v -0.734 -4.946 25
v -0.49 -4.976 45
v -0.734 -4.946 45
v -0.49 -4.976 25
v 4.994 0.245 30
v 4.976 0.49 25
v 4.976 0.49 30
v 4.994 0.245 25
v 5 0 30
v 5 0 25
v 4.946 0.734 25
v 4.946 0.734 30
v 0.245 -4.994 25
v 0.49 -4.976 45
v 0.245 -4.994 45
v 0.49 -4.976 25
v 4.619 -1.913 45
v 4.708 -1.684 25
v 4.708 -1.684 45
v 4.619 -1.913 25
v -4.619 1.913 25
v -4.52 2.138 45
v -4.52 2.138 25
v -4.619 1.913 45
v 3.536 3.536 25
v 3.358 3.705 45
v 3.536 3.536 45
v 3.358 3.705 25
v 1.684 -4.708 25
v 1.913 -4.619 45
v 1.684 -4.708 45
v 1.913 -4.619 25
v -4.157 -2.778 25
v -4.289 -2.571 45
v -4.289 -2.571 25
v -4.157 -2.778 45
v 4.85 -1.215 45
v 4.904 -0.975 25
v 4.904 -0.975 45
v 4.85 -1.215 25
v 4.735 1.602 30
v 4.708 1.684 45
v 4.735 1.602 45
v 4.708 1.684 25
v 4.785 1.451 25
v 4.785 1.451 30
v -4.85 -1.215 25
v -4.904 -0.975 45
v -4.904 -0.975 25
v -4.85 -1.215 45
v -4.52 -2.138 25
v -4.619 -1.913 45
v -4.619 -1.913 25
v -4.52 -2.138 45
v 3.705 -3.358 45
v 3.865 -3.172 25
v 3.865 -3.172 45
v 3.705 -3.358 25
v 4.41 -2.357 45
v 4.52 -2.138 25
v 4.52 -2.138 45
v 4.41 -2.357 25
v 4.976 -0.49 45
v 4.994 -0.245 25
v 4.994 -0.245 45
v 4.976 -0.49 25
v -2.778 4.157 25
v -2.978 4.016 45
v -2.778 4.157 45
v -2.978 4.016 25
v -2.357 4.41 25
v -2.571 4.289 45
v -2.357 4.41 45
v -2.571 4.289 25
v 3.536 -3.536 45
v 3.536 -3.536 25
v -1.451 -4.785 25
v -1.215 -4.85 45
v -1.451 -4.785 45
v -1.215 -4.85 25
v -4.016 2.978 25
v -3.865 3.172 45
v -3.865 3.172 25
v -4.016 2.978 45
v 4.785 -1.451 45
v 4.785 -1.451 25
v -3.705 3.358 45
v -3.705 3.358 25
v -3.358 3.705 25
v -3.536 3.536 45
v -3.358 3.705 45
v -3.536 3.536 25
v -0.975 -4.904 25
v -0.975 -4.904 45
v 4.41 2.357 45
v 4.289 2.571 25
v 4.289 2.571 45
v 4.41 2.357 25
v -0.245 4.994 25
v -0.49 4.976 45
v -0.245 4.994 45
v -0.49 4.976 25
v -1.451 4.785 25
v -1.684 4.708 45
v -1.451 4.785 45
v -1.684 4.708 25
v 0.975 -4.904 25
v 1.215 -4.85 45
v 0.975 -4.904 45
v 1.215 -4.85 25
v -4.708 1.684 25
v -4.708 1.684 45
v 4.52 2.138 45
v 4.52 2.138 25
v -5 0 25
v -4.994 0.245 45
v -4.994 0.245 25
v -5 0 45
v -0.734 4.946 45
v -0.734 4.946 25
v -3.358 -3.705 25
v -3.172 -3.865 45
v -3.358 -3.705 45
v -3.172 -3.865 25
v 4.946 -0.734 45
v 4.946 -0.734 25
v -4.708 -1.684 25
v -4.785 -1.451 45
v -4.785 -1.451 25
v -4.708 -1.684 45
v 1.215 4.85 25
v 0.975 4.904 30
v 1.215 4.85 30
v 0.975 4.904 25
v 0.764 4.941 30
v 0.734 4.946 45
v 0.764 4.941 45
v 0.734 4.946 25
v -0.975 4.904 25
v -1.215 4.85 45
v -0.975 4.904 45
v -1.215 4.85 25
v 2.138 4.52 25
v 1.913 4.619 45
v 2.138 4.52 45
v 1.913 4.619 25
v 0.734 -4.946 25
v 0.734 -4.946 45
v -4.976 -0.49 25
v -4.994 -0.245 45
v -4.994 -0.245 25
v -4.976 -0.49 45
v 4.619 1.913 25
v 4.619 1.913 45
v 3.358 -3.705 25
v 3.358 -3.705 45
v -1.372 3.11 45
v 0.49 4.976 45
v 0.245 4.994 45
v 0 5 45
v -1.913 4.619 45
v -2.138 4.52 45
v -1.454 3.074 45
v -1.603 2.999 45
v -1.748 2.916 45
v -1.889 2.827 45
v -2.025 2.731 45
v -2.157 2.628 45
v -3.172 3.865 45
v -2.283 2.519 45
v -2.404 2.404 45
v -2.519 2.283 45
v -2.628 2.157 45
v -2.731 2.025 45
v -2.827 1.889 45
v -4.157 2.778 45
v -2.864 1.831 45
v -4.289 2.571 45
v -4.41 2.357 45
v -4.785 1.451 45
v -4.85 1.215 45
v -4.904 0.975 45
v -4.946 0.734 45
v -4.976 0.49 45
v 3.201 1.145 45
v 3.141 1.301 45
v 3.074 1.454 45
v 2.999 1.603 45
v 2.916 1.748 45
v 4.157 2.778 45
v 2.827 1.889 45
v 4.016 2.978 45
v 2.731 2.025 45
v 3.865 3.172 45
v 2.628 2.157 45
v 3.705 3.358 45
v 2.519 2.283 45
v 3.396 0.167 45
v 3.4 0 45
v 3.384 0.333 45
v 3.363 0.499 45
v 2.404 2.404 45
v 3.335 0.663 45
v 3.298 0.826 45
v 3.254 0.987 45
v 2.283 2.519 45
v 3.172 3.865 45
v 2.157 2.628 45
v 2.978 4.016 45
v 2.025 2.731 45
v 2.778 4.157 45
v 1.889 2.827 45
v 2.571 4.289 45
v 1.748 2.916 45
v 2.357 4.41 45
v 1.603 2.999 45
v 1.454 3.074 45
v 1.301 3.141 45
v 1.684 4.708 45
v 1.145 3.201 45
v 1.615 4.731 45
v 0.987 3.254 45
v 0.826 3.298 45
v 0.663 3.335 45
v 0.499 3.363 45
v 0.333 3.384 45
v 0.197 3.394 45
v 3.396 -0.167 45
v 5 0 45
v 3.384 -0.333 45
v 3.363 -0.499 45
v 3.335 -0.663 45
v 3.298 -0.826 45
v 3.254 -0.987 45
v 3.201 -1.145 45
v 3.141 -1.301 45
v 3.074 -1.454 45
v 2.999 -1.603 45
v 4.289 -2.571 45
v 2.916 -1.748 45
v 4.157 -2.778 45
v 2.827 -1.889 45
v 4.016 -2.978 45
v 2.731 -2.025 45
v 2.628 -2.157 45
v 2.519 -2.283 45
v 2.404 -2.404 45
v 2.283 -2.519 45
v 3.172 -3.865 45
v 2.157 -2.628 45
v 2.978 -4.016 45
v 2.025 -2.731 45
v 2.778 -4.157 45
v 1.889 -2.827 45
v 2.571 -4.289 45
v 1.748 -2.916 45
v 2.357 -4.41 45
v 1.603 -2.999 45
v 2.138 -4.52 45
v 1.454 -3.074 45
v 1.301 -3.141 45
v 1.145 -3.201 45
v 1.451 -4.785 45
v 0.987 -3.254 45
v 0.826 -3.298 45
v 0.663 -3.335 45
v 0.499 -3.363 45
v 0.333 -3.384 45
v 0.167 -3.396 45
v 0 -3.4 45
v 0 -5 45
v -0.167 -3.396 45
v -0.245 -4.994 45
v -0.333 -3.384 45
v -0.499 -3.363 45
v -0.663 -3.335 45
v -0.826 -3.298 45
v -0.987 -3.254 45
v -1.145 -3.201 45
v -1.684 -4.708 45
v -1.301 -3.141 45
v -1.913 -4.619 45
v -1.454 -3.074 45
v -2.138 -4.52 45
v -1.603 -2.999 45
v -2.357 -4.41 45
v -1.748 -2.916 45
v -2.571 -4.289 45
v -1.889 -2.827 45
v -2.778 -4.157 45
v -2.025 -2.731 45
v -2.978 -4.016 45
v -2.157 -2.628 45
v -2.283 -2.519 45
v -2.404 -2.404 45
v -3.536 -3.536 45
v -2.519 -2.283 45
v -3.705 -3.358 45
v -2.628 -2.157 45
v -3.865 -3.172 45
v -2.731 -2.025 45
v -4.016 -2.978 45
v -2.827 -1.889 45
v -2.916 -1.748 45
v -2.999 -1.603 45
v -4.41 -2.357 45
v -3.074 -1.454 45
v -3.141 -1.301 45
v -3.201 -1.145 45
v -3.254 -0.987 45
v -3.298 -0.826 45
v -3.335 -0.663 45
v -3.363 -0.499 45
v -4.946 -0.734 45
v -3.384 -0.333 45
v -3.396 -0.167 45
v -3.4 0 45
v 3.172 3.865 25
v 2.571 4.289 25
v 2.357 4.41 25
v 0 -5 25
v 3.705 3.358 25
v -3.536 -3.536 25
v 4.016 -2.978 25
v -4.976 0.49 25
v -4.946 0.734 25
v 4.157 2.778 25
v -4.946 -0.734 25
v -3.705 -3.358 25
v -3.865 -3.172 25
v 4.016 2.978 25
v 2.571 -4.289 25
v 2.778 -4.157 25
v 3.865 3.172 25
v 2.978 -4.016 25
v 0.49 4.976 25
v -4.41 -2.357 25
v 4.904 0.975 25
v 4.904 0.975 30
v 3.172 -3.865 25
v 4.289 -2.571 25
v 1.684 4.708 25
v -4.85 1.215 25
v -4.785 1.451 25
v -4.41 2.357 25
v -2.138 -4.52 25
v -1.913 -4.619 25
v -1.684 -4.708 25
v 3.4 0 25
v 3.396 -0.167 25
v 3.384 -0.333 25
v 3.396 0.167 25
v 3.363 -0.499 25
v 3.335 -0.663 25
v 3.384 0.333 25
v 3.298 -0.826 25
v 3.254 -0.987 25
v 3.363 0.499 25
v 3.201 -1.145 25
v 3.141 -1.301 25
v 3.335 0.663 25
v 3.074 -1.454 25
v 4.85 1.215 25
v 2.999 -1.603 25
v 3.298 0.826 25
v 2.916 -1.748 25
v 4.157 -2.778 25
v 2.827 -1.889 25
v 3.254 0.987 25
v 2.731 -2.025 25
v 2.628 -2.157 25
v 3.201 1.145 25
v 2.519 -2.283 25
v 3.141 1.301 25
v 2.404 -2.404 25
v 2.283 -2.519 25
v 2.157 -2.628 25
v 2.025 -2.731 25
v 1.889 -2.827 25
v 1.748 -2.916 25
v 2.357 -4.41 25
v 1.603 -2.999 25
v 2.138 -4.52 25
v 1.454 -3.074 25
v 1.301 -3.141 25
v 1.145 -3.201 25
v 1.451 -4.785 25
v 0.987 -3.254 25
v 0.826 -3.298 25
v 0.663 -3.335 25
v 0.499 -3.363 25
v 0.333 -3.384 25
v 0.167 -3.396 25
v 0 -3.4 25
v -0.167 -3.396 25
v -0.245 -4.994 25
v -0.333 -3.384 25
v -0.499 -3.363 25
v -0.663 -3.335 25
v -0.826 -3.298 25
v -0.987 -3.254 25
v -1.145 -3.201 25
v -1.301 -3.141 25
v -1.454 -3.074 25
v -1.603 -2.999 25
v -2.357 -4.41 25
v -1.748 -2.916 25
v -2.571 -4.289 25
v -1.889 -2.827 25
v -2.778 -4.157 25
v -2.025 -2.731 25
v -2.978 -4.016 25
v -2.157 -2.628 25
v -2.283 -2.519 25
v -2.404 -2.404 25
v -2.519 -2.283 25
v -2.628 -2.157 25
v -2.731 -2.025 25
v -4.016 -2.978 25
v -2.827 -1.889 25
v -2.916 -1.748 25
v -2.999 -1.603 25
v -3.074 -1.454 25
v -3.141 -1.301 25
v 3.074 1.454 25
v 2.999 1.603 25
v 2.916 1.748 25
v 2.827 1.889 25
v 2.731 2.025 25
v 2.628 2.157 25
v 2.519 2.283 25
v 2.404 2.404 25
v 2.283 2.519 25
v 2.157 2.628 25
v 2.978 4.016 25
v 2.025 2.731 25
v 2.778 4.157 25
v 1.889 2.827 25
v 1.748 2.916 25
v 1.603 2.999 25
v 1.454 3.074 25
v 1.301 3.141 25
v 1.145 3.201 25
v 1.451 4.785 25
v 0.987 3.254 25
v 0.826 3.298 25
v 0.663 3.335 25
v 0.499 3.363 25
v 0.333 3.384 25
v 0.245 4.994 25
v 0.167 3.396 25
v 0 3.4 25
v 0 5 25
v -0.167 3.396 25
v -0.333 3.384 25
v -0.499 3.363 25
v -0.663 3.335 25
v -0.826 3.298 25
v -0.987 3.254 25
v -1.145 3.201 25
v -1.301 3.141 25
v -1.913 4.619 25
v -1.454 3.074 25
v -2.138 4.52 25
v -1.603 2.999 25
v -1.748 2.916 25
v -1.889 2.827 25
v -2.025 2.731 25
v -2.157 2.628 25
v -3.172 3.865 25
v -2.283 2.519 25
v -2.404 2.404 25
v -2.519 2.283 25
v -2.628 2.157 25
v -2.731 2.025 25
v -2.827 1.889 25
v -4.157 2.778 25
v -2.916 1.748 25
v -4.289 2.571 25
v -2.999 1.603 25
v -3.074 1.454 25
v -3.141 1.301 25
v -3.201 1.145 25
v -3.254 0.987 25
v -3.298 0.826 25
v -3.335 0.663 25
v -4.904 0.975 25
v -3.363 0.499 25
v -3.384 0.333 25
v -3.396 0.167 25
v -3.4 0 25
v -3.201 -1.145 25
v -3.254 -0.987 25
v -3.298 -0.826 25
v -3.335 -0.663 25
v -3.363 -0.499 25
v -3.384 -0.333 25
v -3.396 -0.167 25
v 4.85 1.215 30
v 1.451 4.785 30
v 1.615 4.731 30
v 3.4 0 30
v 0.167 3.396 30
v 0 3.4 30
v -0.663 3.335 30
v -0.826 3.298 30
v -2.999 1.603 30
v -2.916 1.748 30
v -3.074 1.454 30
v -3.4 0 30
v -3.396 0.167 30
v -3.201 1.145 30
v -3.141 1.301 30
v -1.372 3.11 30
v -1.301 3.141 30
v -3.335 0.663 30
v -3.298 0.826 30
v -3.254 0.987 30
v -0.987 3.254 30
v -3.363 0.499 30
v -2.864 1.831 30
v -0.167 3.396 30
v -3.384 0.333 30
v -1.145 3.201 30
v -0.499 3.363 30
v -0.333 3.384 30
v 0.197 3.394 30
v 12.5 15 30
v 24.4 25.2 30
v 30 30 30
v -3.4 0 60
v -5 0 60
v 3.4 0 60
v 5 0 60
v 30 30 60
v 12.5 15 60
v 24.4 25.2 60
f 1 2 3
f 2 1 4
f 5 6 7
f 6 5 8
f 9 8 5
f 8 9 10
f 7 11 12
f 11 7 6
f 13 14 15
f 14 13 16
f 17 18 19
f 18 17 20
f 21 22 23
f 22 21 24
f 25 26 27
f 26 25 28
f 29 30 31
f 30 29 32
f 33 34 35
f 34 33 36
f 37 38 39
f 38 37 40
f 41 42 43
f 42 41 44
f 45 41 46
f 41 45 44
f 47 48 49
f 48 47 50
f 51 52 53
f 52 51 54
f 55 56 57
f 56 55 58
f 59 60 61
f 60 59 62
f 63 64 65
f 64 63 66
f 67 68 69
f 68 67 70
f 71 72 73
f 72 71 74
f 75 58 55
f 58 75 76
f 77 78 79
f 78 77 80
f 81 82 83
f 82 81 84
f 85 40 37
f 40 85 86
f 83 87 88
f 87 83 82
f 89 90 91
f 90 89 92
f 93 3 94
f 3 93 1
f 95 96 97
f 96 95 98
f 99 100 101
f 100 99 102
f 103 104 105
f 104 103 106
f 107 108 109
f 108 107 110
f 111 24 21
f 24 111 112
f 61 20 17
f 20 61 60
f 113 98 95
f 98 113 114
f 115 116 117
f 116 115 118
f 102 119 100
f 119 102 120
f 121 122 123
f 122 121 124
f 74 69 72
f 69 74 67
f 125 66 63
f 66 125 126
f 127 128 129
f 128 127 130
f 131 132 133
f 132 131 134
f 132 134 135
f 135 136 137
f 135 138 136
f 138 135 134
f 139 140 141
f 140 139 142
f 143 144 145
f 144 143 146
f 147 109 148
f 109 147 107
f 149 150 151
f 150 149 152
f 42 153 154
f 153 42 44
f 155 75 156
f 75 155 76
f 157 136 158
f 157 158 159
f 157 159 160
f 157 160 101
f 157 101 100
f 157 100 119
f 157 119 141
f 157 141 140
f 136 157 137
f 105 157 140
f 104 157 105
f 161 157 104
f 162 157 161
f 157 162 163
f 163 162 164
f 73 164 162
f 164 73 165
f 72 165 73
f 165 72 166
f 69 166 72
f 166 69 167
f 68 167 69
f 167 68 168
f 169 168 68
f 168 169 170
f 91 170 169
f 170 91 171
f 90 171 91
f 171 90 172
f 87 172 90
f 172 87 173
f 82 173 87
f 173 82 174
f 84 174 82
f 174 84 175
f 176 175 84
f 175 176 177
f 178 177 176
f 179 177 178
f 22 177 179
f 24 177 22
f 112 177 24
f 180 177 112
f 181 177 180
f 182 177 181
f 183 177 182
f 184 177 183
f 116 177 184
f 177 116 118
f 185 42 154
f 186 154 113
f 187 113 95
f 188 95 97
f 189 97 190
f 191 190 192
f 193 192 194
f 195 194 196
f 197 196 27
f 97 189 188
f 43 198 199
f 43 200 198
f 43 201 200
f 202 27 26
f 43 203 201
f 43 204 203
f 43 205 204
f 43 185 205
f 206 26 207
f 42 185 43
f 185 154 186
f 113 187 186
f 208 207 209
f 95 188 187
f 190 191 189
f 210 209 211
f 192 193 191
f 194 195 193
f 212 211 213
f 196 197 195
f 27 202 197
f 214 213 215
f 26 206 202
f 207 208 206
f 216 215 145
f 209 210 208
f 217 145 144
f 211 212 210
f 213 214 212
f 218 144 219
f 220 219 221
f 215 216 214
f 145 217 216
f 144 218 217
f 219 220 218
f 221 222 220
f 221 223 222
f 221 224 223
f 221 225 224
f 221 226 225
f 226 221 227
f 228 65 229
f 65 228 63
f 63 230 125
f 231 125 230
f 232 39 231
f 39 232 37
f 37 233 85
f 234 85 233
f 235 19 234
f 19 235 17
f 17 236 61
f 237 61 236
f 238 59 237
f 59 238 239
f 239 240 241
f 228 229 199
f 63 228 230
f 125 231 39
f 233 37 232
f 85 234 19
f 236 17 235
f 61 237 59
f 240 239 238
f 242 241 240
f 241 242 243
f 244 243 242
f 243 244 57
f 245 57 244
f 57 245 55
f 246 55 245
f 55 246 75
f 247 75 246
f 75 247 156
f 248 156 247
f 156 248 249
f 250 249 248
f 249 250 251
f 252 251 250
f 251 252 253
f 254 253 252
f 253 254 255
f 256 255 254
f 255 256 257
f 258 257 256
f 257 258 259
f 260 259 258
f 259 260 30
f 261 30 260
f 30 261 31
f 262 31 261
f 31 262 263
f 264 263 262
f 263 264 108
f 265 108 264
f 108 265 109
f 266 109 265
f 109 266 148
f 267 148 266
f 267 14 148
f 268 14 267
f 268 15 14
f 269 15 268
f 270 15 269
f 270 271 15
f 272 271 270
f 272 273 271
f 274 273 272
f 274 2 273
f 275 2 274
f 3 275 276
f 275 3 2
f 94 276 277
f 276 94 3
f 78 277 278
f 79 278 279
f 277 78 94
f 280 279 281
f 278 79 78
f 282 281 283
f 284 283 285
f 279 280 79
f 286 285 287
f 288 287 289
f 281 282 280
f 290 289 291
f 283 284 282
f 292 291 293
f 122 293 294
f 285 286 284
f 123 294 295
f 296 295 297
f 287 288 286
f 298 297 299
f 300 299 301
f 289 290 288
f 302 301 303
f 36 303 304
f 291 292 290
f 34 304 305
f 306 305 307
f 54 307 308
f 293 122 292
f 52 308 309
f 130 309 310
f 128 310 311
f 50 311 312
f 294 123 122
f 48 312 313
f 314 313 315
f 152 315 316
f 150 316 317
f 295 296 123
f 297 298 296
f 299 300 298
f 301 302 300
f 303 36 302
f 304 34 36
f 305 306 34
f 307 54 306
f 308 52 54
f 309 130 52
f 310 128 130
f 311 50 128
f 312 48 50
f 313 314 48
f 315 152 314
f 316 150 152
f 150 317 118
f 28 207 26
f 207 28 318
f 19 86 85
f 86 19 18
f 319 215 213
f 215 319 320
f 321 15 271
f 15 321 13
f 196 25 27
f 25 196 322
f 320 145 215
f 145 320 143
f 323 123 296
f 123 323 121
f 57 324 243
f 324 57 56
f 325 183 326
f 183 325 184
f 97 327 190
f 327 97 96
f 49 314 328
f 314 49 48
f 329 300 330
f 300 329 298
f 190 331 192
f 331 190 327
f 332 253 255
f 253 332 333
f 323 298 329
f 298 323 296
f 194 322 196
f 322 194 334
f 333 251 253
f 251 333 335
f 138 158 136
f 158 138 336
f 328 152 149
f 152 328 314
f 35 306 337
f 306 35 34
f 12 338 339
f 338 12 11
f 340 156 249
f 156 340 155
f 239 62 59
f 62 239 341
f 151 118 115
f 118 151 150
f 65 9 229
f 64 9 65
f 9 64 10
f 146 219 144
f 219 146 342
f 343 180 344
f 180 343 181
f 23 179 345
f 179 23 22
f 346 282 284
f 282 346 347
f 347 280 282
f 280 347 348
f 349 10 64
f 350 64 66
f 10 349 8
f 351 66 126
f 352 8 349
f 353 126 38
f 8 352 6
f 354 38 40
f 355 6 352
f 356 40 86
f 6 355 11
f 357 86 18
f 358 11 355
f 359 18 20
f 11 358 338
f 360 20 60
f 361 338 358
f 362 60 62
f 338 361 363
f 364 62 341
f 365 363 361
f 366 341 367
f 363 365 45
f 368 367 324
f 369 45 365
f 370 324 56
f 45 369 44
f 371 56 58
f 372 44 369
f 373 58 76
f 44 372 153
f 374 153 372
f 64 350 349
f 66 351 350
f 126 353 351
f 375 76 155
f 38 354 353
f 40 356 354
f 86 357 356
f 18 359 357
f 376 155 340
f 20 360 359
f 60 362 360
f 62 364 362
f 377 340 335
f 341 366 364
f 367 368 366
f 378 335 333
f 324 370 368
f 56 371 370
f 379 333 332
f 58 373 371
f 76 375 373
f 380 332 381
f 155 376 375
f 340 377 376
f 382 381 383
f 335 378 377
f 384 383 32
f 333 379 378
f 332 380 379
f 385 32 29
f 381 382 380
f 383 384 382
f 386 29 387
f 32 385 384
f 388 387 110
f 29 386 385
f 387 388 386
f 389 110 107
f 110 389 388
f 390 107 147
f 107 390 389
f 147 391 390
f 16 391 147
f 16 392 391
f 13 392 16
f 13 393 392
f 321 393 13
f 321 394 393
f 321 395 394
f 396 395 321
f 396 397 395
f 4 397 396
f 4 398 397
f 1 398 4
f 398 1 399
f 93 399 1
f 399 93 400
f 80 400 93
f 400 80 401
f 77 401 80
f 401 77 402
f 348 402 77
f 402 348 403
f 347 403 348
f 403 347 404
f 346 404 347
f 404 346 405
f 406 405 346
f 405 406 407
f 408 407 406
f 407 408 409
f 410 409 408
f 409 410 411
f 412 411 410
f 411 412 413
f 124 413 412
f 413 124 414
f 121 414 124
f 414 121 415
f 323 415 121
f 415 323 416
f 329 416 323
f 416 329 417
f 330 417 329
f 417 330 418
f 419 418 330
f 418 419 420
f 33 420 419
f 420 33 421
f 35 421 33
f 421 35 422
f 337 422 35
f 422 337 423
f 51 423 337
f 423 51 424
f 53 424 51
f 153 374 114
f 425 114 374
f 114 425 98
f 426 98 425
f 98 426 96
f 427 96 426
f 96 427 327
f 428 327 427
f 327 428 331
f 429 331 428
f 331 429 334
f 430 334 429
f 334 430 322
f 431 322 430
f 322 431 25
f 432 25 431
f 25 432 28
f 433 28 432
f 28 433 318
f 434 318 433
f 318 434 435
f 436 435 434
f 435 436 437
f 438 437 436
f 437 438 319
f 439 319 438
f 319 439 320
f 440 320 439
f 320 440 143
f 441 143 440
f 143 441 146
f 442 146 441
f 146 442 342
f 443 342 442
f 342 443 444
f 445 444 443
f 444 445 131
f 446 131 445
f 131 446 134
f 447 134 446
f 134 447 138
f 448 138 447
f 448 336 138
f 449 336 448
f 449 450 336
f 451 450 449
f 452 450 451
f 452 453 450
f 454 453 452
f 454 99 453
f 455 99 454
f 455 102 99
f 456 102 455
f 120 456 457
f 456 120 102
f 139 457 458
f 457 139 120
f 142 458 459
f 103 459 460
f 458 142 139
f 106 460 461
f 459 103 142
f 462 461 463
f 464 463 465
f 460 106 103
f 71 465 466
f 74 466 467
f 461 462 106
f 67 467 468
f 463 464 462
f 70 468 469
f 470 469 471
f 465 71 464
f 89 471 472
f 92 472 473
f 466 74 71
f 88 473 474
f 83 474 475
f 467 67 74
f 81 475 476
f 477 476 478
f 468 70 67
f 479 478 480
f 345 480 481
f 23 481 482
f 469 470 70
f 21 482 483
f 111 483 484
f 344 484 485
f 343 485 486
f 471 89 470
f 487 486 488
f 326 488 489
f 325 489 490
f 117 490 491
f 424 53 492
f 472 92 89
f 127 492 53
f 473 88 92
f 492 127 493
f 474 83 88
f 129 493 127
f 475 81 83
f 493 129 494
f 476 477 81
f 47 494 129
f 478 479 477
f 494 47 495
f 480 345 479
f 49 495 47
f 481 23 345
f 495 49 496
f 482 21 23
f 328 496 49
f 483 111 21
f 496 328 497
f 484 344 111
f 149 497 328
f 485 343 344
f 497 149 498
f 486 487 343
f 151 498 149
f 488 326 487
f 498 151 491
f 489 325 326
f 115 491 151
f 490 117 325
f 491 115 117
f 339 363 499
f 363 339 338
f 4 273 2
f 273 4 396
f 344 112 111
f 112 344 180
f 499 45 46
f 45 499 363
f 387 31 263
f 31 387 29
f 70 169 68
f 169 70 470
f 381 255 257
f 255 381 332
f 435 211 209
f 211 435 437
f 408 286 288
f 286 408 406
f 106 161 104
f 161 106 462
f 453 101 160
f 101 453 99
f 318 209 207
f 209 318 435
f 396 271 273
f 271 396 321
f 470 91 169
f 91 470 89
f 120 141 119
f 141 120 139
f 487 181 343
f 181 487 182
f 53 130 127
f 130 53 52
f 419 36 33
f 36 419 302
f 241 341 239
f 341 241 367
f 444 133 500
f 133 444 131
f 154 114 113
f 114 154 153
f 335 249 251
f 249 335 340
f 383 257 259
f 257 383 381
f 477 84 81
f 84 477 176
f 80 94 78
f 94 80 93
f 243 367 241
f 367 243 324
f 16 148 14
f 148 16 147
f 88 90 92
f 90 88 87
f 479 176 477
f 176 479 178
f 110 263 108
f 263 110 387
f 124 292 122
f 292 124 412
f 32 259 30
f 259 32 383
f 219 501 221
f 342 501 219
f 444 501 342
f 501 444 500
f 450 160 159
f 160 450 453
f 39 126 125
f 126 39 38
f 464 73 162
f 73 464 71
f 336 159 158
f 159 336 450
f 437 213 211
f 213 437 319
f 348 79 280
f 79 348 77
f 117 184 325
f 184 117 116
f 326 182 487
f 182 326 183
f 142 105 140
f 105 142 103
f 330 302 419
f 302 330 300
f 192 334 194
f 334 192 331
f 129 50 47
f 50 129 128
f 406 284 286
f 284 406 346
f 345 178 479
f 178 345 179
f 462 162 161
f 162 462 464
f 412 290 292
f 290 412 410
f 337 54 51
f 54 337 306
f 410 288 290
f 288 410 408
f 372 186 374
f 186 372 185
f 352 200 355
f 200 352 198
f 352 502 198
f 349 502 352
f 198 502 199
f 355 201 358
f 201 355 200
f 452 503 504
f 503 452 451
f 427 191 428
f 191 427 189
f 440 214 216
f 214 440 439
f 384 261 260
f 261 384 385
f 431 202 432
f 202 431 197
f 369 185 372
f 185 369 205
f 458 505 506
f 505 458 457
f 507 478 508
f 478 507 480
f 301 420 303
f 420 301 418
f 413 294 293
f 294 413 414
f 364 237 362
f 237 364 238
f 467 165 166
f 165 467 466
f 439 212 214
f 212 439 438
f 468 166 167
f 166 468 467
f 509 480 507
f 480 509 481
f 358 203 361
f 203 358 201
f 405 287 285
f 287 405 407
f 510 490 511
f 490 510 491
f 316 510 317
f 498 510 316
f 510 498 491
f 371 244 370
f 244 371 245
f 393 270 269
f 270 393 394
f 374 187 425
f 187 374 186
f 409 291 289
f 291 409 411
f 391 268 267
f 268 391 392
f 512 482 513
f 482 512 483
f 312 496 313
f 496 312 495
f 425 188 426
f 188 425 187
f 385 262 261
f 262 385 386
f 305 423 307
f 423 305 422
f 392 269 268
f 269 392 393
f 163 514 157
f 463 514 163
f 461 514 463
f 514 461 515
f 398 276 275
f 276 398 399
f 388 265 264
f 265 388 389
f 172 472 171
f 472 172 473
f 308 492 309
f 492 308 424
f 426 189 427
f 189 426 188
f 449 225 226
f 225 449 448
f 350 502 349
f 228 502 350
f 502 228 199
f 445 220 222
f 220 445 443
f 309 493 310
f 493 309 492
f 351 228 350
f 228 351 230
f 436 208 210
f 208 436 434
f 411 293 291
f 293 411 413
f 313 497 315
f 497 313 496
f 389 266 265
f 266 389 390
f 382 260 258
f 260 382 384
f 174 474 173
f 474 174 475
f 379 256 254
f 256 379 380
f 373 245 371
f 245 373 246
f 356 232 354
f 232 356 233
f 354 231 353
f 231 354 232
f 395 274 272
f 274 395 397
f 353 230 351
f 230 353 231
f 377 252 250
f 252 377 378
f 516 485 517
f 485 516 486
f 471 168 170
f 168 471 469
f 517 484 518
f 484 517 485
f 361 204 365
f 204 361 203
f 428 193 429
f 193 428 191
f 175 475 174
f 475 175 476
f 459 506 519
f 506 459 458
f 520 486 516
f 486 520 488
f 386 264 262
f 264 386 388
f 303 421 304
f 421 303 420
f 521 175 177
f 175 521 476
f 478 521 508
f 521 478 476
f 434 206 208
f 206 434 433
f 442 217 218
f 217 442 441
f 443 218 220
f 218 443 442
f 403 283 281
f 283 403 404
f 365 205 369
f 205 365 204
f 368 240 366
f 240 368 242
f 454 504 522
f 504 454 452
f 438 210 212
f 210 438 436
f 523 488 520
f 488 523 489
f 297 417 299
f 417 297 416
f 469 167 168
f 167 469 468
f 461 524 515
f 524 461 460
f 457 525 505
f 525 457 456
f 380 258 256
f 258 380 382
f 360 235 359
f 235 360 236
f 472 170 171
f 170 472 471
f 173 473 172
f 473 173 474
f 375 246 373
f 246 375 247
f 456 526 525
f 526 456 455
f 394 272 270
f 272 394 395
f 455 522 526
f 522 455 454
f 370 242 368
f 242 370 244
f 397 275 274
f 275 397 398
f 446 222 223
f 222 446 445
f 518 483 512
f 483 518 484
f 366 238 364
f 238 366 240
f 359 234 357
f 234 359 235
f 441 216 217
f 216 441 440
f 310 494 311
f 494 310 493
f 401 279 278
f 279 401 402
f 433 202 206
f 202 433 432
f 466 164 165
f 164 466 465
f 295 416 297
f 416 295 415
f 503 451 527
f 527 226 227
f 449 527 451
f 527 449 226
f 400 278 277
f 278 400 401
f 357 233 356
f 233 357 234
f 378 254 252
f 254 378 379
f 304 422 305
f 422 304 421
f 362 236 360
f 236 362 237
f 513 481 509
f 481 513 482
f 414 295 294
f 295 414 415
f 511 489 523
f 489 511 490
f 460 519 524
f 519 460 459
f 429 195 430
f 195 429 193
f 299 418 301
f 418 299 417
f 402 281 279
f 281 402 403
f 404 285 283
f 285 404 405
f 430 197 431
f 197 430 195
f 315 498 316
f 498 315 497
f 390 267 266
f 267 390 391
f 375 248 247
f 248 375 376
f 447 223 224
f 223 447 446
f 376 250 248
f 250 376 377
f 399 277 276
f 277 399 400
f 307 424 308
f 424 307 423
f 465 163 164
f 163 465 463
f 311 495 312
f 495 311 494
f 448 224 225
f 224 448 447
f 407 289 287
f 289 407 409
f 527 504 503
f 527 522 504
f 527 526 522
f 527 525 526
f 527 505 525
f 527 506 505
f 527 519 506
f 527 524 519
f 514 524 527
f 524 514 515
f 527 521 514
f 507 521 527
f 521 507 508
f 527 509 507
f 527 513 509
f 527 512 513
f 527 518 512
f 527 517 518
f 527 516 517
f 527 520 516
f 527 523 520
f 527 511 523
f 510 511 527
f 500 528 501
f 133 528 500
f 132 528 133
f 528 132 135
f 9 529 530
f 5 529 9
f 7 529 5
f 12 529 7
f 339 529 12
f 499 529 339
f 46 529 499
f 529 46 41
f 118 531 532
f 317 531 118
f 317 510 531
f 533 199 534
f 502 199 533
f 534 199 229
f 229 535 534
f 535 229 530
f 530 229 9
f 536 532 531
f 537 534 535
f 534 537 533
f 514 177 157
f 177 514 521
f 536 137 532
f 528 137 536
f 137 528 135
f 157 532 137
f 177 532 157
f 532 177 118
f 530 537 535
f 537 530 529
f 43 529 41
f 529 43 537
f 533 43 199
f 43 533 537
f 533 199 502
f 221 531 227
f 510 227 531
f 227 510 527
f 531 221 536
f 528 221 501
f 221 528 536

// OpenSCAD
$fn = 128; // High resolution for smooth cone and round holes

// --- Dimensions (mm) ---
// Spout dimensions
$spout_outer_d = 10;
$spout_inner_d = 6.8; // 10 - 2*1.6
$spout_height = 20;

// Cone dimensions
$cone_bottom_d = 10; // Matches spout outer diameter
$cone_top_d = 60;
$cone_height = 30;   // From z=20 to z=50

// Wall thickness
$wall_thickness = 1.6;

// Derived dimensions
$part_total_height = $spout_height + $cone_height; // 50mm
$part_radius_outer = $spout_outer_d / 2;
$part_radius_inner = $spout_inner_d / 2;

// --- Construction ---

module spout() {
    // Create the cylindrical spout with a hole through it
    difference() {
        // Outer cylinder
        cylinder(h = $spout_height, r = $part_radius_outer, center = [0, 0, $spout_height/2]);
        
        // Inner bore (hole)
        cylinder(h = $spout_height, r = $part_radius_inner, center = [0, 0, $spout_height/2]);
    }
}

module cone() {
    // Create the conical funnel part
    difference() {
        // Outer cone
        // Linear extrusion of a triangle rotated 90 deg around Y to form a cone
        // Base at z=0 (relative to cone start), height $cone_height
        // Outer radius at base = $part_radius_outer, at top = $cone_top_d / 2
        linear_extrude(height = $cone_height, center = true) {
            polygon(points = [
                [-($part_radius_outer), 0],
                [($part_radius_outer), 0],
                [($cone_top_d / 2), $cone_height]
            ], convexity = 3);
        }
        
        // Inner cone (hole)
        // Inner radius at base = $part_radius_inner, at top = ($cone_top_d - 2*$wall_thickness) / 2
        $inner_top_d = $cone_top_d - (2 * $wall_thickness);
        $inner_top_r = $inner_top_d / 2;
        
        linear_extrude(height = $cone_height, center = true) {
            polygon(points = [
                [-($part_radius_inner), 0],
                [($part_radius_inner), 0],
                [($inner_top_r), $cone_height]
            ], convexity = 3);
        }
    }
}

// --- Main Assembly ---
// Translate to center the part vertically (z=0 to z=50 -> center at z=25)
// The prompt asks for print orientation upright, wide opening at top.
// We model it centered on origin for symmetry, resting on XY plane logic is handled by the build direction.
translate([0, 0, $part_total_height / 2]) {
    union() {
        spout();
        translate([0, 0, $spout_height]) {
            cone();
        }
    }
}
